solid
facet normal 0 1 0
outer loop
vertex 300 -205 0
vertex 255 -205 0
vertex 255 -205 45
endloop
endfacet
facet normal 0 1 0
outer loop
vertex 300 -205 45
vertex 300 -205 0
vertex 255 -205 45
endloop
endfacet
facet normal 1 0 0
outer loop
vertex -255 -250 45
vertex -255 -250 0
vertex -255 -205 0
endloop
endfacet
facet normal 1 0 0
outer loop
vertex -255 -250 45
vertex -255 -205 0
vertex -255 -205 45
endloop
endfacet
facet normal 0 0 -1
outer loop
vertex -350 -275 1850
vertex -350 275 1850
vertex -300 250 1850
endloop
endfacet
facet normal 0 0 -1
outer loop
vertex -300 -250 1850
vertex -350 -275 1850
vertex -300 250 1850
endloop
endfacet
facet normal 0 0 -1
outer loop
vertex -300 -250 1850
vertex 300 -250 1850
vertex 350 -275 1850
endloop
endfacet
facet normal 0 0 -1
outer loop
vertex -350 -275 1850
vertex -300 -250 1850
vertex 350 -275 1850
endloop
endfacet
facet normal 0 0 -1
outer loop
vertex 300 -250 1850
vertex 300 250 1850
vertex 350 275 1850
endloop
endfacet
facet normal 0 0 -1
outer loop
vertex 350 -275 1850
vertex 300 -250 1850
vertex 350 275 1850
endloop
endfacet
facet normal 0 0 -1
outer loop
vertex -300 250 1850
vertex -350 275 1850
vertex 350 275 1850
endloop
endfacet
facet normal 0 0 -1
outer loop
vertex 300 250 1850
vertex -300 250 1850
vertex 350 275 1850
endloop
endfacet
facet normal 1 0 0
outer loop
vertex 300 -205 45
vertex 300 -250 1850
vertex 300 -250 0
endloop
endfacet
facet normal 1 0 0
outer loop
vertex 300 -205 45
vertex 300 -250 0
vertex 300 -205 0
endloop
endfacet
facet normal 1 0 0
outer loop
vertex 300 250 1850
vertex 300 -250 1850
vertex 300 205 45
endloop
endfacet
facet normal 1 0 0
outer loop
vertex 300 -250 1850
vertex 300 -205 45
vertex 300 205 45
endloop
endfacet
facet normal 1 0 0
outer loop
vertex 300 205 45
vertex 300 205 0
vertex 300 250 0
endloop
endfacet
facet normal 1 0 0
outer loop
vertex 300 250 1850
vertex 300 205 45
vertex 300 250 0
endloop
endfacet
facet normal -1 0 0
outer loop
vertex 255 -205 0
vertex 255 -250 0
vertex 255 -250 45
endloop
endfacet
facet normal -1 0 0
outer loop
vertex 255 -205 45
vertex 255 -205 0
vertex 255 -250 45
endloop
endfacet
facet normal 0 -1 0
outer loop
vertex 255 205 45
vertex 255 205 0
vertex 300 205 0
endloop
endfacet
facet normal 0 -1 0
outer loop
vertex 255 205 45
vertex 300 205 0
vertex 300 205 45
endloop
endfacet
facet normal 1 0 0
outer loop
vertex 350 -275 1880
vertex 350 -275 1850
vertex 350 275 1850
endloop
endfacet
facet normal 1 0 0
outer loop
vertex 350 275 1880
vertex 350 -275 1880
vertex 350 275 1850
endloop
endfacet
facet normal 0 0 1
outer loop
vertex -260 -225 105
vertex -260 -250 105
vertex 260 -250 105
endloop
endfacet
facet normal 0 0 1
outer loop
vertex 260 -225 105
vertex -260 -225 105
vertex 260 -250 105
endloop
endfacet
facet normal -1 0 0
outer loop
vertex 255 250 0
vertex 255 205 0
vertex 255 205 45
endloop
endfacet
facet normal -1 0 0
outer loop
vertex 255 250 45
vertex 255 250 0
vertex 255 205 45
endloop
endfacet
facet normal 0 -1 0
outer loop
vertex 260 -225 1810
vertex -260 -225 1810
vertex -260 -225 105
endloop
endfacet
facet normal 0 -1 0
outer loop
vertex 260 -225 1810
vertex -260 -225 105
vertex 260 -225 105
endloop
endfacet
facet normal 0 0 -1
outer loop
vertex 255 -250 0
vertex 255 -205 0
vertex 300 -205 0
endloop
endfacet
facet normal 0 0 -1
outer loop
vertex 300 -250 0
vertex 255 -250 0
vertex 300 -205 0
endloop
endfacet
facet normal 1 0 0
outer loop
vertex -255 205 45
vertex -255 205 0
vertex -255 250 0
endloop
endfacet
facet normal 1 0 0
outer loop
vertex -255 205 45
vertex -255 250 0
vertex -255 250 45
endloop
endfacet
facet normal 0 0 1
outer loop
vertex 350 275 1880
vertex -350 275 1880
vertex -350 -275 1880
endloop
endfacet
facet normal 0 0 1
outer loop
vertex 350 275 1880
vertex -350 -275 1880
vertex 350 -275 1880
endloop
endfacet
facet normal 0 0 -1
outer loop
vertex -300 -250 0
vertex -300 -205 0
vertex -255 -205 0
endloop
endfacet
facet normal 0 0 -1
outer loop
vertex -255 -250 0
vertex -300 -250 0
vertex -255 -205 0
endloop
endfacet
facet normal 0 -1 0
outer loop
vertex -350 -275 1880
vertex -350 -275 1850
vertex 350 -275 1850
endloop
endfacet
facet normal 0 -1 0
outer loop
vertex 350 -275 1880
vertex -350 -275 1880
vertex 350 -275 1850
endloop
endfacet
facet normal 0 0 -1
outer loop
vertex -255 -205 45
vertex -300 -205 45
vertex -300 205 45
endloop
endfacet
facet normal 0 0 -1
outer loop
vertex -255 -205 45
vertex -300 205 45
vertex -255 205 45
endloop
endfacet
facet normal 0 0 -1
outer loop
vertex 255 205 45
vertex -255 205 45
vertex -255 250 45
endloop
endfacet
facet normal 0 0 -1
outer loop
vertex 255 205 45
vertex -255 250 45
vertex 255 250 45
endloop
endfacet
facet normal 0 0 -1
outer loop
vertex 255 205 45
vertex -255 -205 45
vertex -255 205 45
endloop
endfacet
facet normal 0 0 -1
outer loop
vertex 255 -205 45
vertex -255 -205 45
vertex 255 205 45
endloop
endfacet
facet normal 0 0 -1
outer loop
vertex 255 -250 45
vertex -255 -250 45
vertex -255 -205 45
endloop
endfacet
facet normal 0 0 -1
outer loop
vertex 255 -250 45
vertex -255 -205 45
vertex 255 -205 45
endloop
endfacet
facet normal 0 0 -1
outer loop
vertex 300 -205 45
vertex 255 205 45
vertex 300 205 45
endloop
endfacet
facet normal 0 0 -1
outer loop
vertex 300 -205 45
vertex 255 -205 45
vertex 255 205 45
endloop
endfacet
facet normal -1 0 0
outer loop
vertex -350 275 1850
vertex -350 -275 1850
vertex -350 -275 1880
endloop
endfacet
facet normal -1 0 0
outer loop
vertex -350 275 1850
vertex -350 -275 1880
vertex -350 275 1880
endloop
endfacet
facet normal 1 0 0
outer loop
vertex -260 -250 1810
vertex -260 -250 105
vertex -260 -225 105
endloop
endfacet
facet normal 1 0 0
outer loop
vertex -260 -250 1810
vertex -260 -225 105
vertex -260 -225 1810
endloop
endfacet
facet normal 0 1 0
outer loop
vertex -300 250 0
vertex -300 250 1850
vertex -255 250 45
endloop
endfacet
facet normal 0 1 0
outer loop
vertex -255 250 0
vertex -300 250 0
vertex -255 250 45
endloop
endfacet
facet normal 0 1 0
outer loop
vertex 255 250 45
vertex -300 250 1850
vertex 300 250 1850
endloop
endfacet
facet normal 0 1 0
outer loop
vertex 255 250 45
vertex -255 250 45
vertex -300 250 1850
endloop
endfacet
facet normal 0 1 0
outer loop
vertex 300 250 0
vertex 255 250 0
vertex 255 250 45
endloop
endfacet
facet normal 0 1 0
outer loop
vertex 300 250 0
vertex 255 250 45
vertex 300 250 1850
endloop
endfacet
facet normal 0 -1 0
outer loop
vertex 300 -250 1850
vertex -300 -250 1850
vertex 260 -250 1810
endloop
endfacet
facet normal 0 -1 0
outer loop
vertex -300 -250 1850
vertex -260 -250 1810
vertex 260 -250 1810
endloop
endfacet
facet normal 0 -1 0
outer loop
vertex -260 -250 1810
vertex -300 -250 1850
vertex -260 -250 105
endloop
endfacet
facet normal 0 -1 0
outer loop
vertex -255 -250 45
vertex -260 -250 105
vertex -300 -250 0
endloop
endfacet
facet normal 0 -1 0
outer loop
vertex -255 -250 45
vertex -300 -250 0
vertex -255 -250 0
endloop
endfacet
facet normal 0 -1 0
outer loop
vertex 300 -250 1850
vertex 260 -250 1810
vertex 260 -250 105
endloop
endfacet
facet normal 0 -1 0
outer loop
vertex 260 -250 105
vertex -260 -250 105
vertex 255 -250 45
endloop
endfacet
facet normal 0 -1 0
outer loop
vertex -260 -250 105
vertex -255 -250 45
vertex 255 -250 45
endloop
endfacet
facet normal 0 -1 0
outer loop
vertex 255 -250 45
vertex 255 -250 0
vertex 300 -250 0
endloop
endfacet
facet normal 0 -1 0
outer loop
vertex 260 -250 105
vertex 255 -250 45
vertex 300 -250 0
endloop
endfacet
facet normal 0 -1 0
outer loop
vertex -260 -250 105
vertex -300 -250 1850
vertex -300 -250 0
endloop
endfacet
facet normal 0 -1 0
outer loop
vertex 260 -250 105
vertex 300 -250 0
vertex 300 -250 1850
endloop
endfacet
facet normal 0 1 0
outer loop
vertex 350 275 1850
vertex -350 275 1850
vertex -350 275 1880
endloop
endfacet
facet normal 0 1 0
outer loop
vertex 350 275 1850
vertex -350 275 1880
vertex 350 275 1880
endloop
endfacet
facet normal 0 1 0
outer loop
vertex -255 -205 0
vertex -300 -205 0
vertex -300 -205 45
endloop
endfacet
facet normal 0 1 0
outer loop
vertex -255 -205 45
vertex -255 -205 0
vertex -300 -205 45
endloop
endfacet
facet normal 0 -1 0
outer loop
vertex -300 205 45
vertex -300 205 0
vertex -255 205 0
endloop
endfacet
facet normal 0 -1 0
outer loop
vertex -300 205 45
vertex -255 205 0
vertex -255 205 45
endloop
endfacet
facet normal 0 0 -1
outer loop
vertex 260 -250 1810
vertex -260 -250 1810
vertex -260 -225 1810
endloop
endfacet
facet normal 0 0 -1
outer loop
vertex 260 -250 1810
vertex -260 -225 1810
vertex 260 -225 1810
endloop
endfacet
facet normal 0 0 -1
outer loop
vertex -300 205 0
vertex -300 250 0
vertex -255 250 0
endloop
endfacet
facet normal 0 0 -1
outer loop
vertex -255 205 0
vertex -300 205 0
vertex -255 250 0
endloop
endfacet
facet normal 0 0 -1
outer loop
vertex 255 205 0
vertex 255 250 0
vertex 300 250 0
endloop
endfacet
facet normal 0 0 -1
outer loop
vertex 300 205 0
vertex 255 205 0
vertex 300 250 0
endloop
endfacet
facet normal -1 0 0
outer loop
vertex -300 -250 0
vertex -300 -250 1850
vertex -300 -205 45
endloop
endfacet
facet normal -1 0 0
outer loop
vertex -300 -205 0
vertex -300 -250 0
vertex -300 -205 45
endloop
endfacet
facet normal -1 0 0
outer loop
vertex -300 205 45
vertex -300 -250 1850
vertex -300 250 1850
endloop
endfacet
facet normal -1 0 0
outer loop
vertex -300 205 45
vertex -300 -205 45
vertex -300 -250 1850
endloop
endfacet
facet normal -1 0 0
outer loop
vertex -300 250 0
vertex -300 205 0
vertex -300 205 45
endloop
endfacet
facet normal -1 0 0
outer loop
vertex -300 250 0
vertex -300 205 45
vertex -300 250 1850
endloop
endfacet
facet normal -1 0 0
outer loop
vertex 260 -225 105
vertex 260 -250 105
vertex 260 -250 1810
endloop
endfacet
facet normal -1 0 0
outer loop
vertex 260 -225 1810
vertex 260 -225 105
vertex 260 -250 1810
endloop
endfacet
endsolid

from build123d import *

# Parameters (mm, degrees)
F0_W     = 600
F0_H     = 500
F1_DEPTH = 1850
F2_W     = 700
F2_H     = 550
F3_DEPTH = 30
F4_W     = 510
F4_H     = 45
F5_DEPTH = 500
F6_W     = 410
F6_H     = 45
F7_DEPTH = 650.001
F8_W     = 520
F8_H     = 1705
F9_DEPTH = 25


with BuildPart() as f1:
    # F0 (on Top) → F1 (new body)
    with BuildSketch(Plane.XY):
        Rectangle(F0_W, F0_H)
    extrude(amount=F1_DEPTH)

    # F2 (on face) → F3 (join)
    with BuildSketch(Plane.XY.offset(1850)):
        Rectangle(F2_W, F2_H)
    extrude(amount=F3_DEPTH)

    # F4 (on face) → F5 (cut, through all)
    with BuildSketch(Plane.XZ.offset(250)):
        with Locations((0, 22.5)):
            Rectangle(F4_W, F4_H)
    extrude(amount=-F5_DEPTH, mode=Mode.SUBTRACT)

    # F6 (on face) → F7 (cut, through all)
    with BuildSketch(Plane(origin=(-300, 0, 0), x_dir=(0, -1, 0), z_dir=(-1, 0, 0))):
        with Locations((0, 22.5)):
            Rectangle(F6_W, F6_H)
    extrude(amount=-F7_DEPTH, mode=Mode.SUBTRACT)

    # F8 (on face) → F9 (cut)
    with BuildSketch(Plane.XZ.offset(250)):
        with Locations((0, 957.5)):
            Rectangle(F8_W, F8_H)
    extrude(amount=-F9_DEPTH, mode=Mode.SUBTRACT)


solid = f1.part
